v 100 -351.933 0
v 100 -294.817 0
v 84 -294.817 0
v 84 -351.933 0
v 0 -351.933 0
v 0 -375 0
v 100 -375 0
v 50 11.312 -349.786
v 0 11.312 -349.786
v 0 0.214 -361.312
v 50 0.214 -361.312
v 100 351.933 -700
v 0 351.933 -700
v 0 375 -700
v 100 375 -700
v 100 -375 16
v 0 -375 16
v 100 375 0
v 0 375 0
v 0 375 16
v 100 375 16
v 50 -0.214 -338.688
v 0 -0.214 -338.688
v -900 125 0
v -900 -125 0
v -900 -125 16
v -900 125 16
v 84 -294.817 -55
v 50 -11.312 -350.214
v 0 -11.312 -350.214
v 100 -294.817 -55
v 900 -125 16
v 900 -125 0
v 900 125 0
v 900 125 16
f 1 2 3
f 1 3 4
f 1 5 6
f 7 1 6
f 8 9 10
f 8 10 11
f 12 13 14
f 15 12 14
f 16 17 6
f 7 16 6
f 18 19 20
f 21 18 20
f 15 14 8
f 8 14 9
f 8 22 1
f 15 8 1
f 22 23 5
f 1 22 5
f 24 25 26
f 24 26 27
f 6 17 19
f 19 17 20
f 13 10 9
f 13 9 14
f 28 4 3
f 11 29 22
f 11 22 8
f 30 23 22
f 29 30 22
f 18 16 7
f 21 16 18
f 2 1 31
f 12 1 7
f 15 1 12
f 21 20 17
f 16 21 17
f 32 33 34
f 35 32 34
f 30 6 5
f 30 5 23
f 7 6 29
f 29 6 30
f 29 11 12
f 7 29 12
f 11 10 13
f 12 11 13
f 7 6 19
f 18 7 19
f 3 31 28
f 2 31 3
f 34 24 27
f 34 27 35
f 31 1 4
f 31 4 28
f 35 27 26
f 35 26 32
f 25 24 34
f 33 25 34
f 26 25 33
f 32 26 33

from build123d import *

# Parameters (mm, degrees)
F0_W     = 1800
F0_H     = 250
F1_DEPTH = 16
F3_DEPTH = 100
F4_W     = 50
F4_H     = 16
F5_DEPTH = 16
F6_DEPTH = 100
F8_DEPTH = 16


# Not quite as in the source:
# - the program builds the solid bodies; features that only make, move or delete a surface that nothing else refers to are left out


with BuildPart() as f1:
    # F0 (on Top) → F1 (new body)
    with BuildSketch(Plane.XY):
        Rectangle(F0_W, F0_H)
    extrude(amount=F1_DEPTH)


with BuildPart() as f3:
    # F2 (on Right) → F3 (new body)
    with BuildSketch(Plane.YZ):
        Polygon((-351.933169445, 0), (-375, 0), (351.933169445, -700), (375, -700), align=None)
    extrude(amount=F3_DEPTH)

    # F4 (on face) → F5 (cut, through all)
    with BuildSketch(Plane(origin=(0, -169.3262597137, -175.8412494914), x_dir=(1, 0, 0), z_dir=(0, 0.6936366902, 0.7203250252))):
        with Locations((25, 242.772841577)):
            Rectangle(F4_W, F4_H)
    extrude(amount=-F5_DEPTH, mode=Mode.SUBTRACT)


with BuildPart() as f6:
    # F2 (on Right) → F6 (new body, through all)
    with BuildSketch(Plane.YZ):
        Polygon((-375, 16), (-375, 0), (-351.933169445, 0), (375, 0), (375, 16), align=None)
    extrude(amount=F6_DEPTH)


with BuildPart() as f8:
    # F7 (on face) → F8 (new body)
    with BuildSketch(Plane.YZ.offset(100)):
        Polygon((-294.8169918458, 0), (-351.933169445, 0), (-294.8169918458, -55), align=None)
    extrude(amount=-F8_DEPTH)


solid = Compound([f1.part, f3.part, f6.part, f8.part])
